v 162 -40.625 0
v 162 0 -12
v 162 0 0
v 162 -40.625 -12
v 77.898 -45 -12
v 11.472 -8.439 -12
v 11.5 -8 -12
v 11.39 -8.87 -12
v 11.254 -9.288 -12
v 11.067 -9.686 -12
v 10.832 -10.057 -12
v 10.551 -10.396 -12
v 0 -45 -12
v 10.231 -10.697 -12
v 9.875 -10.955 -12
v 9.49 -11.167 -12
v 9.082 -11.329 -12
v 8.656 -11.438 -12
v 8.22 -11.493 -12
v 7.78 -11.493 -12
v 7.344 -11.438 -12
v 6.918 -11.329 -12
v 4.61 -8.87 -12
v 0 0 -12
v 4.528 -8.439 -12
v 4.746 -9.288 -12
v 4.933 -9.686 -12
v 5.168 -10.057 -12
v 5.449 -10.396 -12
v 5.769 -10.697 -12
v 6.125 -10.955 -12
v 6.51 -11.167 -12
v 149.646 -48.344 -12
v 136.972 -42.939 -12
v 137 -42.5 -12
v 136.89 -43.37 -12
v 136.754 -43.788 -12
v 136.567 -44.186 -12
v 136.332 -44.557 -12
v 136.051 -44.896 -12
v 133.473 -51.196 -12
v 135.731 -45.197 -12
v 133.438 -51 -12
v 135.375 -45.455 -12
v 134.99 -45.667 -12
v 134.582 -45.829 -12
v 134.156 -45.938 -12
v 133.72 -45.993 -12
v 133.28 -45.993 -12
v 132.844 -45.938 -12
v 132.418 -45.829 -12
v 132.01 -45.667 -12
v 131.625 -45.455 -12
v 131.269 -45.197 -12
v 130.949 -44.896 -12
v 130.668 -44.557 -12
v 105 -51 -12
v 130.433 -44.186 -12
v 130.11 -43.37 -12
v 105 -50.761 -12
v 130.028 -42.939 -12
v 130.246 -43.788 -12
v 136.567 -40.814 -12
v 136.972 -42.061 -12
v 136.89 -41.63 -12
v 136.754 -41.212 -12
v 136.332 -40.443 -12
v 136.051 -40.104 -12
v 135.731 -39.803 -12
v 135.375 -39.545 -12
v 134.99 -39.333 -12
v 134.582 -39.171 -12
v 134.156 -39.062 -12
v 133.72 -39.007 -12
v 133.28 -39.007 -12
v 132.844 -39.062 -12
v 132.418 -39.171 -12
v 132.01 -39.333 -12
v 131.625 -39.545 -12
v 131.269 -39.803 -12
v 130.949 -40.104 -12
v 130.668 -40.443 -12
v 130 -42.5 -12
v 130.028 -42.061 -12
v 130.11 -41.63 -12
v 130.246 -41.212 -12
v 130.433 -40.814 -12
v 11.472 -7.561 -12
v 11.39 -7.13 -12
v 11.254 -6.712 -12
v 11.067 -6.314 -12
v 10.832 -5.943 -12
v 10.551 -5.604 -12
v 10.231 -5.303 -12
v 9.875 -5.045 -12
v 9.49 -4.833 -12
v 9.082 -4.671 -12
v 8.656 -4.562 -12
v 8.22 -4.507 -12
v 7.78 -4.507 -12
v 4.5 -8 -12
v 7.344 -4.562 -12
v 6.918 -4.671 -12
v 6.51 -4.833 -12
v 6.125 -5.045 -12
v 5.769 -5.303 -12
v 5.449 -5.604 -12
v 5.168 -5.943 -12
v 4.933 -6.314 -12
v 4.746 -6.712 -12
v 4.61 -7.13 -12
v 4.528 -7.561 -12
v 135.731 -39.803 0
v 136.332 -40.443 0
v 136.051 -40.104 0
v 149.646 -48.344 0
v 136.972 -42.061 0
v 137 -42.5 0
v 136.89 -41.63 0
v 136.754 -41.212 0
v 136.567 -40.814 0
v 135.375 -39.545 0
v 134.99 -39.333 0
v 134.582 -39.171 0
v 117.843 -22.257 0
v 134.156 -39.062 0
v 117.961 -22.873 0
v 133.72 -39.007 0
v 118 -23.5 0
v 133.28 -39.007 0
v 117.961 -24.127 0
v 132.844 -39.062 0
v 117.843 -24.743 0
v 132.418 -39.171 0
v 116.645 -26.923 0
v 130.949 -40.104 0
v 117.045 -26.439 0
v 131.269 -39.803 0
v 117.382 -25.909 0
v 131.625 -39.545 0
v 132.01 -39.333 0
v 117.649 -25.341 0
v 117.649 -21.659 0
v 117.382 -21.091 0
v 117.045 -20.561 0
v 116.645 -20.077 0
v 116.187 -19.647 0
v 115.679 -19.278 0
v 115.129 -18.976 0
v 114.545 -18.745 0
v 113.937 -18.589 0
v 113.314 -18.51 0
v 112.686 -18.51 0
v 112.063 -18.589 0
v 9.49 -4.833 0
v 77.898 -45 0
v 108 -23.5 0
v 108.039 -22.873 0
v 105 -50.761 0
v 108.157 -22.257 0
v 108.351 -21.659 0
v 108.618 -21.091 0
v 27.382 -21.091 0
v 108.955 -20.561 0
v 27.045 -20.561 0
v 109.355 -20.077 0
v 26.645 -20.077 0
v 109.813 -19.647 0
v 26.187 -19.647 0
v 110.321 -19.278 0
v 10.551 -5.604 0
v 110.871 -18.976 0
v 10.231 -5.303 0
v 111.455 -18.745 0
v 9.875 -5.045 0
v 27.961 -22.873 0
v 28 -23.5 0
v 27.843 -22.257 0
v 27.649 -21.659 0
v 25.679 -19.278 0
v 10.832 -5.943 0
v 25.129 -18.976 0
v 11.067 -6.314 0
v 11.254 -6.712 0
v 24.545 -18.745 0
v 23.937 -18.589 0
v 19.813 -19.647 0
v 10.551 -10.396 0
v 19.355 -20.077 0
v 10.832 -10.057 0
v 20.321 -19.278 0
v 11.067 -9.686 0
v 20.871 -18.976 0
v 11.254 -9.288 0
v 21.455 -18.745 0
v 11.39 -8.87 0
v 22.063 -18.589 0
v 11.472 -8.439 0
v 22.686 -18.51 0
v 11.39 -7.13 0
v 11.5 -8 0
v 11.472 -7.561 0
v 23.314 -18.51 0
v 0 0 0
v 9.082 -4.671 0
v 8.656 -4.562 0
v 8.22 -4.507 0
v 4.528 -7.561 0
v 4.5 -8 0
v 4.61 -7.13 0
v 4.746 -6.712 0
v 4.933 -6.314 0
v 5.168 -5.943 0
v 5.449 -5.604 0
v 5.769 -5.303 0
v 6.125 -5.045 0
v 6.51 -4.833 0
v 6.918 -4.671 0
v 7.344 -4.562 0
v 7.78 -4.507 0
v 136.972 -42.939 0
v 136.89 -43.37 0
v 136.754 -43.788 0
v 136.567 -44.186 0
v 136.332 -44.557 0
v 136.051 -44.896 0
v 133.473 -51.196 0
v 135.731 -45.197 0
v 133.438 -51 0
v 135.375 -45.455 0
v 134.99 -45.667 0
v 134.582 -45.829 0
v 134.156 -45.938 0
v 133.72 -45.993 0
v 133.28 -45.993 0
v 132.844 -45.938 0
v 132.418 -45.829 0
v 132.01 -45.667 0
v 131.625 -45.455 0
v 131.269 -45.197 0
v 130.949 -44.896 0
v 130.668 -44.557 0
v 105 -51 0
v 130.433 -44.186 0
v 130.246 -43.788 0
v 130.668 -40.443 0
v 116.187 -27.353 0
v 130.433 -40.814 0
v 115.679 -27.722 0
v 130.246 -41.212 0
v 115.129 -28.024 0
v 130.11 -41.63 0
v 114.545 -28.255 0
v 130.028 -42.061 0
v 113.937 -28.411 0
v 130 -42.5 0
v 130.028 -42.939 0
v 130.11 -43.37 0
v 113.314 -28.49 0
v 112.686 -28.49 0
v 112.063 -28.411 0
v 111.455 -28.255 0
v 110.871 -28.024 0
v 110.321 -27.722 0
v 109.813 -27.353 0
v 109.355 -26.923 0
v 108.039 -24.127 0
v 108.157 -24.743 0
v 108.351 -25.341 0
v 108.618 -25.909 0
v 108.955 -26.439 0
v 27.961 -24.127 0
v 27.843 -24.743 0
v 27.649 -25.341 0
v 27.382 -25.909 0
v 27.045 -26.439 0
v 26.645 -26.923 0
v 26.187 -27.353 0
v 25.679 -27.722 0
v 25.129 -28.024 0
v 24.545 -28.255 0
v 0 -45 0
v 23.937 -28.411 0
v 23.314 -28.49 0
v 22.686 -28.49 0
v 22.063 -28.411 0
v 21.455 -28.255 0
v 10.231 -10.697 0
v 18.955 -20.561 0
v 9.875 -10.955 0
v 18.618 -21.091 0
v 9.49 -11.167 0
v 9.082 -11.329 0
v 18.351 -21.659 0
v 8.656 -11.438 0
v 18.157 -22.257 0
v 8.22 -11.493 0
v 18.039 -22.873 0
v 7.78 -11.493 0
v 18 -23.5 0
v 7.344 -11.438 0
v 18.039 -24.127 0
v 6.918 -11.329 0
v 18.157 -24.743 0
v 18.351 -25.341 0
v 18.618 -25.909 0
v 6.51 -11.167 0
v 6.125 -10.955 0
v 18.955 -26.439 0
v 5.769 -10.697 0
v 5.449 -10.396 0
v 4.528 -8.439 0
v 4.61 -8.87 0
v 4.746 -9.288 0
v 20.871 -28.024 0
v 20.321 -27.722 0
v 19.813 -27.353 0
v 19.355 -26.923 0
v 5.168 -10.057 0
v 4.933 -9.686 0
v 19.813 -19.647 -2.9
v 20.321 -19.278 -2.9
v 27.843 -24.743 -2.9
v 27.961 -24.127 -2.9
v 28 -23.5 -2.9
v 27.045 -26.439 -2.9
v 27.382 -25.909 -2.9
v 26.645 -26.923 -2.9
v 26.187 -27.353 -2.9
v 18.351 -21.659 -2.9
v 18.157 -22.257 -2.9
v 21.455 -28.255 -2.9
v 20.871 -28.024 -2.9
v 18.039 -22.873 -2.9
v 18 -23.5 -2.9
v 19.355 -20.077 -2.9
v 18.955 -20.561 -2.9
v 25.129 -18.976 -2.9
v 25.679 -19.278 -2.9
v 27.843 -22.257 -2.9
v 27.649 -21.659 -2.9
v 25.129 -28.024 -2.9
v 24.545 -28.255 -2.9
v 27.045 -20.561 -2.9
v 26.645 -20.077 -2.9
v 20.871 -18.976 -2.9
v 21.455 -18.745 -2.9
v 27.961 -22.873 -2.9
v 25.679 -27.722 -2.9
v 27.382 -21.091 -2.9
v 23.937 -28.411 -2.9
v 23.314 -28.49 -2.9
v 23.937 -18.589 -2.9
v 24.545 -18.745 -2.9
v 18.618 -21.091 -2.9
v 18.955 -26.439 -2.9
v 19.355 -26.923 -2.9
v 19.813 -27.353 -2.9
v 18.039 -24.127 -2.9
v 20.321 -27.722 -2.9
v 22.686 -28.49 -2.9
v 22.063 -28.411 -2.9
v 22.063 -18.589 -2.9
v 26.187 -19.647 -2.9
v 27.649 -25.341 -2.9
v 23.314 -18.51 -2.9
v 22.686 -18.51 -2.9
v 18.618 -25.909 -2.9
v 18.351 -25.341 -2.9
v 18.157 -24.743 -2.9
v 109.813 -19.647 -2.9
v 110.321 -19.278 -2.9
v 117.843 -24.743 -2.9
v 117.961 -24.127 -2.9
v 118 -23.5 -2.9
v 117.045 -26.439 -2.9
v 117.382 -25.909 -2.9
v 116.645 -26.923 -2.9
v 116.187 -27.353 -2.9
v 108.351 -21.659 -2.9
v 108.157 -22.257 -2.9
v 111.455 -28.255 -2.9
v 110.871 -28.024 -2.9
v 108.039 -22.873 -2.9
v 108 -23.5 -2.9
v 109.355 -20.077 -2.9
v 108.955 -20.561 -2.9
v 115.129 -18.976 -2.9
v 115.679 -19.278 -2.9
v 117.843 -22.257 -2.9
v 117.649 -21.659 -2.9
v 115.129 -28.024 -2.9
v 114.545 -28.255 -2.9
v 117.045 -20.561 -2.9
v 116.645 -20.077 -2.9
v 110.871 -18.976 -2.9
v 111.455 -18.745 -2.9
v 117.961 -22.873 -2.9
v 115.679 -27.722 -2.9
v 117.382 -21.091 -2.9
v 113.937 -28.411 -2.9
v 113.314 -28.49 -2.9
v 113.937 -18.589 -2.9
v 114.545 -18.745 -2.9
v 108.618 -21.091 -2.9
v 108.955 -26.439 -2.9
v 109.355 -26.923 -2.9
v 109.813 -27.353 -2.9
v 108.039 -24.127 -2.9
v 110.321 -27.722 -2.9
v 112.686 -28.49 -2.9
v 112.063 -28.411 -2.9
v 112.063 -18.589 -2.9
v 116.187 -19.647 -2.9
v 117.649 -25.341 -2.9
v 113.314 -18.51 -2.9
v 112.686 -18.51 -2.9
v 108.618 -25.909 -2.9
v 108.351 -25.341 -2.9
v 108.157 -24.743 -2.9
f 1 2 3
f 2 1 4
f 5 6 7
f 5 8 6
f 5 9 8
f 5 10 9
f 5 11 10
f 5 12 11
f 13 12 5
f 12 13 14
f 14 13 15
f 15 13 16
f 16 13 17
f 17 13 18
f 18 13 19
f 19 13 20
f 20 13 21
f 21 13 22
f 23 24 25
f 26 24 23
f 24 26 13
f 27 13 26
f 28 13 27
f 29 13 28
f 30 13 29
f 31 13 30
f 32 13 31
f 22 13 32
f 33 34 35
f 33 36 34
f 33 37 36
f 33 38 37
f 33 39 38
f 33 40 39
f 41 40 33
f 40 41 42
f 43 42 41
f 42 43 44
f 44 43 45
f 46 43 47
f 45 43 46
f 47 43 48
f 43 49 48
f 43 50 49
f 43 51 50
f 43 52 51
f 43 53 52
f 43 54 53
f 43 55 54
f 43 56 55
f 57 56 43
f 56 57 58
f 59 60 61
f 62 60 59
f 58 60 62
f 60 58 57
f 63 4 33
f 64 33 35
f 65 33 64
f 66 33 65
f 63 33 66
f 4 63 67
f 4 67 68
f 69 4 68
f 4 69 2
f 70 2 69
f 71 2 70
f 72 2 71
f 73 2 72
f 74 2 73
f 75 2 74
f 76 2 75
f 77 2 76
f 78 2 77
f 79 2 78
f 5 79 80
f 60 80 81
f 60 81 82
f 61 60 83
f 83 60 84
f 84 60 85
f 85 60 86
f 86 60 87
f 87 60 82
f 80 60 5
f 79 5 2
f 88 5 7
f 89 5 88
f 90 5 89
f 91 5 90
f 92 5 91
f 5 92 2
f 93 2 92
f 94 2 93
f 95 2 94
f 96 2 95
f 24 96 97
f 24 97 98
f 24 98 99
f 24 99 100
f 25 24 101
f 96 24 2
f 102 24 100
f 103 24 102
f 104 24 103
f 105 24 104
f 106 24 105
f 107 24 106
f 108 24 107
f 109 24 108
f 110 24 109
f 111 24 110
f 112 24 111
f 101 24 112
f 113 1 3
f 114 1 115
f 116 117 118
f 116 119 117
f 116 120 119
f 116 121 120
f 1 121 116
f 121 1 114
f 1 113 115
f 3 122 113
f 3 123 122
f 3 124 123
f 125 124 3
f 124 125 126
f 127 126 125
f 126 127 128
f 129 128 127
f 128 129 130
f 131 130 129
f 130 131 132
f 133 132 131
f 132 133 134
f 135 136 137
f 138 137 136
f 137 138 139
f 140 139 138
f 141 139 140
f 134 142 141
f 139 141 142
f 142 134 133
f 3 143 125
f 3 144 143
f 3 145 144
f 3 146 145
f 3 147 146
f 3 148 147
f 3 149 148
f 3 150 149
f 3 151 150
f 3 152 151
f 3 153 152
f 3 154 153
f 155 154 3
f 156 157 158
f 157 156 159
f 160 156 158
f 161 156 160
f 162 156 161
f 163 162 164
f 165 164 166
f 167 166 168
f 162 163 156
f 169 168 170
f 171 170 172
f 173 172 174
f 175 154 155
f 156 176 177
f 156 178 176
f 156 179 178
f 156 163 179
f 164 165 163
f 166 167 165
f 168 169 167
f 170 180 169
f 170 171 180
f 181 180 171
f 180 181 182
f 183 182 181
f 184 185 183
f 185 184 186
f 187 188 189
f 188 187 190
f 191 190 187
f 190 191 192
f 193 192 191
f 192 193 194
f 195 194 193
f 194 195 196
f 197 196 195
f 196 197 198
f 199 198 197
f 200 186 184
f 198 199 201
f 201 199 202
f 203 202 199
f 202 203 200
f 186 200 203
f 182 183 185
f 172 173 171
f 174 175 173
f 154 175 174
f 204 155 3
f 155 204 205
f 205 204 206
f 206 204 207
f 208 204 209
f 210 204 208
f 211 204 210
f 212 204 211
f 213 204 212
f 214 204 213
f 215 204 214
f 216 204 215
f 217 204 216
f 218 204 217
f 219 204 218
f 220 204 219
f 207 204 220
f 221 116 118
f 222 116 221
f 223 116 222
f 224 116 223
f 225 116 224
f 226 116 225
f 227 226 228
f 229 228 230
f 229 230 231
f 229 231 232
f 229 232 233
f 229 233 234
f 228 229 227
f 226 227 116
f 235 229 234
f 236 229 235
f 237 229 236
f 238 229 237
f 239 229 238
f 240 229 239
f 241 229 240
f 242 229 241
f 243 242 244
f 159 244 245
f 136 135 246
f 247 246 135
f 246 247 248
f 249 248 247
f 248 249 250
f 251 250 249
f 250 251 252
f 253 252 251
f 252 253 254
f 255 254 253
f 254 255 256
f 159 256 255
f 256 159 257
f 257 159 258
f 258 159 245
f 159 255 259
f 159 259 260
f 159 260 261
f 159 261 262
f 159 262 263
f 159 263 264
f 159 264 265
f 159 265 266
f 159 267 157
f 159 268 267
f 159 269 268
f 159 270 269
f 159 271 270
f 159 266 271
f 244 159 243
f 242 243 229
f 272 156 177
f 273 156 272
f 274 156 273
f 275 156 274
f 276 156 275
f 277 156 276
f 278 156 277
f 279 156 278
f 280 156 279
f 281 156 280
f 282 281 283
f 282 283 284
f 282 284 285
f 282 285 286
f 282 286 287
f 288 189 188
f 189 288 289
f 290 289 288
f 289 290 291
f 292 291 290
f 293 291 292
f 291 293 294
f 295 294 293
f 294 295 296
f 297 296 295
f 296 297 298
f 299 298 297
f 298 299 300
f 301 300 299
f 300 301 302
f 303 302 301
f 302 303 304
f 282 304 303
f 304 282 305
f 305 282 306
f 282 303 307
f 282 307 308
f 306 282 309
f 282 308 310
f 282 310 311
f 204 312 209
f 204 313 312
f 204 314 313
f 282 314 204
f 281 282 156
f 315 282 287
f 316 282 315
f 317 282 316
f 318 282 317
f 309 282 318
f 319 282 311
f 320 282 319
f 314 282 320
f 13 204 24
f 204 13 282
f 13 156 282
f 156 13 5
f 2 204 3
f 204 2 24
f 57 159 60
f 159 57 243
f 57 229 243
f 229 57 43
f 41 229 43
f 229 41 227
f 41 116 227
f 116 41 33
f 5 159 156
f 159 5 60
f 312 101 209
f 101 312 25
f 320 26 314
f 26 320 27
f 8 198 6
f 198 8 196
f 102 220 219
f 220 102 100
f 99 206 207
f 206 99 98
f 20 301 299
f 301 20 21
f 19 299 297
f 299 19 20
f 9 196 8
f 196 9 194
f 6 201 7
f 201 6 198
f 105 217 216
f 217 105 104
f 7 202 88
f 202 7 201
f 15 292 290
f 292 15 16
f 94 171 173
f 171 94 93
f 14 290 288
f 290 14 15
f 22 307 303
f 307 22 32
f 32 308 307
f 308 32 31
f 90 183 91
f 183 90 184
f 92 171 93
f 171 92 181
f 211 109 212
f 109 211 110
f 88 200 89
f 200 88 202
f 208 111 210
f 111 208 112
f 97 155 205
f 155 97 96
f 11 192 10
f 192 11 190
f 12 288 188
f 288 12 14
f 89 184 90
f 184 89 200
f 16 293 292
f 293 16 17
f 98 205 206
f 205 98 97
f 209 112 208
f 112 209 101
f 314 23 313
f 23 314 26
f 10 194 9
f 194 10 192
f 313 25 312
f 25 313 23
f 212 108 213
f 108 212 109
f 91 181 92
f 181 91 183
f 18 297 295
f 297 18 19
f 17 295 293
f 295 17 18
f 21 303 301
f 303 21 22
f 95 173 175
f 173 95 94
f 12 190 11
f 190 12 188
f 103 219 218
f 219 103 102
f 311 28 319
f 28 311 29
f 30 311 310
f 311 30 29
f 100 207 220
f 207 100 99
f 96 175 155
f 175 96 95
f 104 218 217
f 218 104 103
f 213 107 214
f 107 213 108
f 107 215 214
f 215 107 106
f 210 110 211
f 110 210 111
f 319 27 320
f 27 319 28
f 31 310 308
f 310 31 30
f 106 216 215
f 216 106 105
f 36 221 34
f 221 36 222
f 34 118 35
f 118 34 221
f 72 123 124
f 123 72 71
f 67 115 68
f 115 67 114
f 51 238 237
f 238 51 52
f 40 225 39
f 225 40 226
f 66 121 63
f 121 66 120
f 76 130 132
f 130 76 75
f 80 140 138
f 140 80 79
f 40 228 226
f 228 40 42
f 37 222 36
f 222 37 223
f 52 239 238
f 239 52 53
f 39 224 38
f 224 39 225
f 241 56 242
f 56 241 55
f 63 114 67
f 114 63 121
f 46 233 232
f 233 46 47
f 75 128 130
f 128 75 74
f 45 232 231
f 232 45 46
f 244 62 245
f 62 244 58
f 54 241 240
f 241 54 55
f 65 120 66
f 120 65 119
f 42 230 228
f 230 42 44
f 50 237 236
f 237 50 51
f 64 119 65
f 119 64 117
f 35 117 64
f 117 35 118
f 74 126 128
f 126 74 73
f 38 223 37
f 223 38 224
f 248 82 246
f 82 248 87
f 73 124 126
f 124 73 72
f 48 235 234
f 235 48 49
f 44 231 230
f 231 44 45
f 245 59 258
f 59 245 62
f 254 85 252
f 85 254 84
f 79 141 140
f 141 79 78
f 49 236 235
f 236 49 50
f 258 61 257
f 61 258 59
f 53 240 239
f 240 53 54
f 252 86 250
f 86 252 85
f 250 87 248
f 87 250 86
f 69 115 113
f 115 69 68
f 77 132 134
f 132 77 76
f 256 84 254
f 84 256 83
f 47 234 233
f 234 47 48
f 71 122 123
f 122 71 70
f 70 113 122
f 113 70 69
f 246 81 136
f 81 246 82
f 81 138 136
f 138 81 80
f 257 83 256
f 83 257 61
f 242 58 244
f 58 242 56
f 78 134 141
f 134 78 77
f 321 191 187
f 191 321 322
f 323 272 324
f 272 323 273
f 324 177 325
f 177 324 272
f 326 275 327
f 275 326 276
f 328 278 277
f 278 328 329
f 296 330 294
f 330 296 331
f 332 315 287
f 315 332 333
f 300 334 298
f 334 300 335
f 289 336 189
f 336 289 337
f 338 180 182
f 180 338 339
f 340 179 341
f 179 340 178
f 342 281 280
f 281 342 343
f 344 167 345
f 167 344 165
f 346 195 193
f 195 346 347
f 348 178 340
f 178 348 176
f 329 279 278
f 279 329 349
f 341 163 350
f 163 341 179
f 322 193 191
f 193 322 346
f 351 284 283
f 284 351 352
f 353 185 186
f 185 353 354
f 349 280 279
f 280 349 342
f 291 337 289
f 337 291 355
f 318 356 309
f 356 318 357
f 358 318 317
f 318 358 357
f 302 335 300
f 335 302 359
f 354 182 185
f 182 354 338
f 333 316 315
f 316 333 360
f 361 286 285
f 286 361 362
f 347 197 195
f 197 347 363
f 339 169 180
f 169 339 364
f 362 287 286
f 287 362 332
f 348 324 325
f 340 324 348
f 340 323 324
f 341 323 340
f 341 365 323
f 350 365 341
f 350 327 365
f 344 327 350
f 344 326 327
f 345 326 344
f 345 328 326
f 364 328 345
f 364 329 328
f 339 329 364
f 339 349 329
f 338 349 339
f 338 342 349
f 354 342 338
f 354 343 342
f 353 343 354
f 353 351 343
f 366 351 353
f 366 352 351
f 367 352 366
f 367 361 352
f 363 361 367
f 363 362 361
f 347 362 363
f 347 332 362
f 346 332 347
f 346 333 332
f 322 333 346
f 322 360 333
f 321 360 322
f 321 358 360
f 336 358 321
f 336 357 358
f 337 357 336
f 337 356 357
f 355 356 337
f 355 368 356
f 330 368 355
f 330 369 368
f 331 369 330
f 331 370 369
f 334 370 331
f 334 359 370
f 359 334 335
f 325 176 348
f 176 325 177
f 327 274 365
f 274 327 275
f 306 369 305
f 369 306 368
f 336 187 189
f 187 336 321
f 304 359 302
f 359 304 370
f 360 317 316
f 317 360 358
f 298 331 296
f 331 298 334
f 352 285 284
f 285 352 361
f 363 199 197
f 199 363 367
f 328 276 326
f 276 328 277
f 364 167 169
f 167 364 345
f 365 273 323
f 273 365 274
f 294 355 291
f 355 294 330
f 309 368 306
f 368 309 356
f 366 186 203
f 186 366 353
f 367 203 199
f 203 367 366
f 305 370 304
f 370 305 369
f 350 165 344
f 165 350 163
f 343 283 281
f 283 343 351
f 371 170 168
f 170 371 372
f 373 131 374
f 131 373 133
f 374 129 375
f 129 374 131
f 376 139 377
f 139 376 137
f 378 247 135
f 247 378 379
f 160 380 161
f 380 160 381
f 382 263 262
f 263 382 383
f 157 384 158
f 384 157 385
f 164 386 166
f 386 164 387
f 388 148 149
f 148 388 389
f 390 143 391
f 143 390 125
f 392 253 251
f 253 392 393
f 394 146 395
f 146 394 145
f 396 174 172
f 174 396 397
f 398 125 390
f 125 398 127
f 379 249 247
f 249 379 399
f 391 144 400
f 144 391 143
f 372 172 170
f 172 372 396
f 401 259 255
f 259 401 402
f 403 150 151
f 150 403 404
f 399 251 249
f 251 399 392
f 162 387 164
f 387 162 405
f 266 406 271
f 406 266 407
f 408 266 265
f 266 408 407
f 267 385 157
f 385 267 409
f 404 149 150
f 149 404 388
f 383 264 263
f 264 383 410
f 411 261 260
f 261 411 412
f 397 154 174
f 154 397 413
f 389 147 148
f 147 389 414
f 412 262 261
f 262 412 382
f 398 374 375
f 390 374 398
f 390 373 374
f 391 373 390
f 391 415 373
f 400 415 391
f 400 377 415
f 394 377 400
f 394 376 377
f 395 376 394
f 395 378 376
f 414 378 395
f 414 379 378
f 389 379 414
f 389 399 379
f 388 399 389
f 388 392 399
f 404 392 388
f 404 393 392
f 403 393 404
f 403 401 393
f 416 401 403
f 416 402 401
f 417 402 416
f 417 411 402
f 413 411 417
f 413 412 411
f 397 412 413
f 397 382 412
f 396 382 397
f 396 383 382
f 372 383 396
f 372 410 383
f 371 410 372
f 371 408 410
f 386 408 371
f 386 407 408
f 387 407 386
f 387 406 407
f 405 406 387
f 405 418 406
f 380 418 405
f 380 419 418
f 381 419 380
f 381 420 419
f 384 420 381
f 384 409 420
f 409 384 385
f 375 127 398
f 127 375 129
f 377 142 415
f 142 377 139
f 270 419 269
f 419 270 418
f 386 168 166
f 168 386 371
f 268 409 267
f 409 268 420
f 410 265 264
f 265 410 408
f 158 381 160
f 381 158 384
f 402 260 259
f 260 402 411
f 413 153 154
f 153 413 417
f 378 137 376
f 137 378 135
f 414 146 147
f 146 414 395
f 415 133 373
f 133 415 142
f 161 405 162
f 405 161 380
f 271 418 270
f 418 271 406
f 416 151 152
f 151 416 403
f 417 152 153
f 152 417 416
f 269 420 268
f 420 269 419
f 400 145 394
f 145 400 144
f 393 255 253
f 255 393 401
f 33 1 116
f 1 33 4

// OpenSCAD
//This will increase the thickness of the part, in mm.
Part_Thickness = 12;

//This will change the raidus of the bolt holes, in mm.
Thread_Radius = 3.5;

rotate([180, 0, 0])union(){difference(){union(){difference(){union(){cube([162, 45, Part_Thickness]);
translate([105, -0, 0])cube([28.5, 51, Part_Thickness]);
translate([130, 31.5, 0])rotate([0,0, -10])cube([29, 20, Part_Thickness]);
translate([80, 25, 0])rotate([0,0, 12])cube([30, 20, Part_Thickness]);}


union(){translate([8, 8, -0.5])cylinder(r=Thread_Radius, h=20, $fn=50);
translate([133.5, 42.5, -0.5])cylinder(r=Thread_Radius, h=20, $fn=50);

translate([23, 23.5, -0.1])cylinder(r=5, h=3, $fn=50);
translate([113, 23.5, -0.1])cylinder(r=5, h=3, $fn=50);
translate([163, 40, -1])rotate([0, 0, 58])cube([5, 16, 20]);}}}

}}
